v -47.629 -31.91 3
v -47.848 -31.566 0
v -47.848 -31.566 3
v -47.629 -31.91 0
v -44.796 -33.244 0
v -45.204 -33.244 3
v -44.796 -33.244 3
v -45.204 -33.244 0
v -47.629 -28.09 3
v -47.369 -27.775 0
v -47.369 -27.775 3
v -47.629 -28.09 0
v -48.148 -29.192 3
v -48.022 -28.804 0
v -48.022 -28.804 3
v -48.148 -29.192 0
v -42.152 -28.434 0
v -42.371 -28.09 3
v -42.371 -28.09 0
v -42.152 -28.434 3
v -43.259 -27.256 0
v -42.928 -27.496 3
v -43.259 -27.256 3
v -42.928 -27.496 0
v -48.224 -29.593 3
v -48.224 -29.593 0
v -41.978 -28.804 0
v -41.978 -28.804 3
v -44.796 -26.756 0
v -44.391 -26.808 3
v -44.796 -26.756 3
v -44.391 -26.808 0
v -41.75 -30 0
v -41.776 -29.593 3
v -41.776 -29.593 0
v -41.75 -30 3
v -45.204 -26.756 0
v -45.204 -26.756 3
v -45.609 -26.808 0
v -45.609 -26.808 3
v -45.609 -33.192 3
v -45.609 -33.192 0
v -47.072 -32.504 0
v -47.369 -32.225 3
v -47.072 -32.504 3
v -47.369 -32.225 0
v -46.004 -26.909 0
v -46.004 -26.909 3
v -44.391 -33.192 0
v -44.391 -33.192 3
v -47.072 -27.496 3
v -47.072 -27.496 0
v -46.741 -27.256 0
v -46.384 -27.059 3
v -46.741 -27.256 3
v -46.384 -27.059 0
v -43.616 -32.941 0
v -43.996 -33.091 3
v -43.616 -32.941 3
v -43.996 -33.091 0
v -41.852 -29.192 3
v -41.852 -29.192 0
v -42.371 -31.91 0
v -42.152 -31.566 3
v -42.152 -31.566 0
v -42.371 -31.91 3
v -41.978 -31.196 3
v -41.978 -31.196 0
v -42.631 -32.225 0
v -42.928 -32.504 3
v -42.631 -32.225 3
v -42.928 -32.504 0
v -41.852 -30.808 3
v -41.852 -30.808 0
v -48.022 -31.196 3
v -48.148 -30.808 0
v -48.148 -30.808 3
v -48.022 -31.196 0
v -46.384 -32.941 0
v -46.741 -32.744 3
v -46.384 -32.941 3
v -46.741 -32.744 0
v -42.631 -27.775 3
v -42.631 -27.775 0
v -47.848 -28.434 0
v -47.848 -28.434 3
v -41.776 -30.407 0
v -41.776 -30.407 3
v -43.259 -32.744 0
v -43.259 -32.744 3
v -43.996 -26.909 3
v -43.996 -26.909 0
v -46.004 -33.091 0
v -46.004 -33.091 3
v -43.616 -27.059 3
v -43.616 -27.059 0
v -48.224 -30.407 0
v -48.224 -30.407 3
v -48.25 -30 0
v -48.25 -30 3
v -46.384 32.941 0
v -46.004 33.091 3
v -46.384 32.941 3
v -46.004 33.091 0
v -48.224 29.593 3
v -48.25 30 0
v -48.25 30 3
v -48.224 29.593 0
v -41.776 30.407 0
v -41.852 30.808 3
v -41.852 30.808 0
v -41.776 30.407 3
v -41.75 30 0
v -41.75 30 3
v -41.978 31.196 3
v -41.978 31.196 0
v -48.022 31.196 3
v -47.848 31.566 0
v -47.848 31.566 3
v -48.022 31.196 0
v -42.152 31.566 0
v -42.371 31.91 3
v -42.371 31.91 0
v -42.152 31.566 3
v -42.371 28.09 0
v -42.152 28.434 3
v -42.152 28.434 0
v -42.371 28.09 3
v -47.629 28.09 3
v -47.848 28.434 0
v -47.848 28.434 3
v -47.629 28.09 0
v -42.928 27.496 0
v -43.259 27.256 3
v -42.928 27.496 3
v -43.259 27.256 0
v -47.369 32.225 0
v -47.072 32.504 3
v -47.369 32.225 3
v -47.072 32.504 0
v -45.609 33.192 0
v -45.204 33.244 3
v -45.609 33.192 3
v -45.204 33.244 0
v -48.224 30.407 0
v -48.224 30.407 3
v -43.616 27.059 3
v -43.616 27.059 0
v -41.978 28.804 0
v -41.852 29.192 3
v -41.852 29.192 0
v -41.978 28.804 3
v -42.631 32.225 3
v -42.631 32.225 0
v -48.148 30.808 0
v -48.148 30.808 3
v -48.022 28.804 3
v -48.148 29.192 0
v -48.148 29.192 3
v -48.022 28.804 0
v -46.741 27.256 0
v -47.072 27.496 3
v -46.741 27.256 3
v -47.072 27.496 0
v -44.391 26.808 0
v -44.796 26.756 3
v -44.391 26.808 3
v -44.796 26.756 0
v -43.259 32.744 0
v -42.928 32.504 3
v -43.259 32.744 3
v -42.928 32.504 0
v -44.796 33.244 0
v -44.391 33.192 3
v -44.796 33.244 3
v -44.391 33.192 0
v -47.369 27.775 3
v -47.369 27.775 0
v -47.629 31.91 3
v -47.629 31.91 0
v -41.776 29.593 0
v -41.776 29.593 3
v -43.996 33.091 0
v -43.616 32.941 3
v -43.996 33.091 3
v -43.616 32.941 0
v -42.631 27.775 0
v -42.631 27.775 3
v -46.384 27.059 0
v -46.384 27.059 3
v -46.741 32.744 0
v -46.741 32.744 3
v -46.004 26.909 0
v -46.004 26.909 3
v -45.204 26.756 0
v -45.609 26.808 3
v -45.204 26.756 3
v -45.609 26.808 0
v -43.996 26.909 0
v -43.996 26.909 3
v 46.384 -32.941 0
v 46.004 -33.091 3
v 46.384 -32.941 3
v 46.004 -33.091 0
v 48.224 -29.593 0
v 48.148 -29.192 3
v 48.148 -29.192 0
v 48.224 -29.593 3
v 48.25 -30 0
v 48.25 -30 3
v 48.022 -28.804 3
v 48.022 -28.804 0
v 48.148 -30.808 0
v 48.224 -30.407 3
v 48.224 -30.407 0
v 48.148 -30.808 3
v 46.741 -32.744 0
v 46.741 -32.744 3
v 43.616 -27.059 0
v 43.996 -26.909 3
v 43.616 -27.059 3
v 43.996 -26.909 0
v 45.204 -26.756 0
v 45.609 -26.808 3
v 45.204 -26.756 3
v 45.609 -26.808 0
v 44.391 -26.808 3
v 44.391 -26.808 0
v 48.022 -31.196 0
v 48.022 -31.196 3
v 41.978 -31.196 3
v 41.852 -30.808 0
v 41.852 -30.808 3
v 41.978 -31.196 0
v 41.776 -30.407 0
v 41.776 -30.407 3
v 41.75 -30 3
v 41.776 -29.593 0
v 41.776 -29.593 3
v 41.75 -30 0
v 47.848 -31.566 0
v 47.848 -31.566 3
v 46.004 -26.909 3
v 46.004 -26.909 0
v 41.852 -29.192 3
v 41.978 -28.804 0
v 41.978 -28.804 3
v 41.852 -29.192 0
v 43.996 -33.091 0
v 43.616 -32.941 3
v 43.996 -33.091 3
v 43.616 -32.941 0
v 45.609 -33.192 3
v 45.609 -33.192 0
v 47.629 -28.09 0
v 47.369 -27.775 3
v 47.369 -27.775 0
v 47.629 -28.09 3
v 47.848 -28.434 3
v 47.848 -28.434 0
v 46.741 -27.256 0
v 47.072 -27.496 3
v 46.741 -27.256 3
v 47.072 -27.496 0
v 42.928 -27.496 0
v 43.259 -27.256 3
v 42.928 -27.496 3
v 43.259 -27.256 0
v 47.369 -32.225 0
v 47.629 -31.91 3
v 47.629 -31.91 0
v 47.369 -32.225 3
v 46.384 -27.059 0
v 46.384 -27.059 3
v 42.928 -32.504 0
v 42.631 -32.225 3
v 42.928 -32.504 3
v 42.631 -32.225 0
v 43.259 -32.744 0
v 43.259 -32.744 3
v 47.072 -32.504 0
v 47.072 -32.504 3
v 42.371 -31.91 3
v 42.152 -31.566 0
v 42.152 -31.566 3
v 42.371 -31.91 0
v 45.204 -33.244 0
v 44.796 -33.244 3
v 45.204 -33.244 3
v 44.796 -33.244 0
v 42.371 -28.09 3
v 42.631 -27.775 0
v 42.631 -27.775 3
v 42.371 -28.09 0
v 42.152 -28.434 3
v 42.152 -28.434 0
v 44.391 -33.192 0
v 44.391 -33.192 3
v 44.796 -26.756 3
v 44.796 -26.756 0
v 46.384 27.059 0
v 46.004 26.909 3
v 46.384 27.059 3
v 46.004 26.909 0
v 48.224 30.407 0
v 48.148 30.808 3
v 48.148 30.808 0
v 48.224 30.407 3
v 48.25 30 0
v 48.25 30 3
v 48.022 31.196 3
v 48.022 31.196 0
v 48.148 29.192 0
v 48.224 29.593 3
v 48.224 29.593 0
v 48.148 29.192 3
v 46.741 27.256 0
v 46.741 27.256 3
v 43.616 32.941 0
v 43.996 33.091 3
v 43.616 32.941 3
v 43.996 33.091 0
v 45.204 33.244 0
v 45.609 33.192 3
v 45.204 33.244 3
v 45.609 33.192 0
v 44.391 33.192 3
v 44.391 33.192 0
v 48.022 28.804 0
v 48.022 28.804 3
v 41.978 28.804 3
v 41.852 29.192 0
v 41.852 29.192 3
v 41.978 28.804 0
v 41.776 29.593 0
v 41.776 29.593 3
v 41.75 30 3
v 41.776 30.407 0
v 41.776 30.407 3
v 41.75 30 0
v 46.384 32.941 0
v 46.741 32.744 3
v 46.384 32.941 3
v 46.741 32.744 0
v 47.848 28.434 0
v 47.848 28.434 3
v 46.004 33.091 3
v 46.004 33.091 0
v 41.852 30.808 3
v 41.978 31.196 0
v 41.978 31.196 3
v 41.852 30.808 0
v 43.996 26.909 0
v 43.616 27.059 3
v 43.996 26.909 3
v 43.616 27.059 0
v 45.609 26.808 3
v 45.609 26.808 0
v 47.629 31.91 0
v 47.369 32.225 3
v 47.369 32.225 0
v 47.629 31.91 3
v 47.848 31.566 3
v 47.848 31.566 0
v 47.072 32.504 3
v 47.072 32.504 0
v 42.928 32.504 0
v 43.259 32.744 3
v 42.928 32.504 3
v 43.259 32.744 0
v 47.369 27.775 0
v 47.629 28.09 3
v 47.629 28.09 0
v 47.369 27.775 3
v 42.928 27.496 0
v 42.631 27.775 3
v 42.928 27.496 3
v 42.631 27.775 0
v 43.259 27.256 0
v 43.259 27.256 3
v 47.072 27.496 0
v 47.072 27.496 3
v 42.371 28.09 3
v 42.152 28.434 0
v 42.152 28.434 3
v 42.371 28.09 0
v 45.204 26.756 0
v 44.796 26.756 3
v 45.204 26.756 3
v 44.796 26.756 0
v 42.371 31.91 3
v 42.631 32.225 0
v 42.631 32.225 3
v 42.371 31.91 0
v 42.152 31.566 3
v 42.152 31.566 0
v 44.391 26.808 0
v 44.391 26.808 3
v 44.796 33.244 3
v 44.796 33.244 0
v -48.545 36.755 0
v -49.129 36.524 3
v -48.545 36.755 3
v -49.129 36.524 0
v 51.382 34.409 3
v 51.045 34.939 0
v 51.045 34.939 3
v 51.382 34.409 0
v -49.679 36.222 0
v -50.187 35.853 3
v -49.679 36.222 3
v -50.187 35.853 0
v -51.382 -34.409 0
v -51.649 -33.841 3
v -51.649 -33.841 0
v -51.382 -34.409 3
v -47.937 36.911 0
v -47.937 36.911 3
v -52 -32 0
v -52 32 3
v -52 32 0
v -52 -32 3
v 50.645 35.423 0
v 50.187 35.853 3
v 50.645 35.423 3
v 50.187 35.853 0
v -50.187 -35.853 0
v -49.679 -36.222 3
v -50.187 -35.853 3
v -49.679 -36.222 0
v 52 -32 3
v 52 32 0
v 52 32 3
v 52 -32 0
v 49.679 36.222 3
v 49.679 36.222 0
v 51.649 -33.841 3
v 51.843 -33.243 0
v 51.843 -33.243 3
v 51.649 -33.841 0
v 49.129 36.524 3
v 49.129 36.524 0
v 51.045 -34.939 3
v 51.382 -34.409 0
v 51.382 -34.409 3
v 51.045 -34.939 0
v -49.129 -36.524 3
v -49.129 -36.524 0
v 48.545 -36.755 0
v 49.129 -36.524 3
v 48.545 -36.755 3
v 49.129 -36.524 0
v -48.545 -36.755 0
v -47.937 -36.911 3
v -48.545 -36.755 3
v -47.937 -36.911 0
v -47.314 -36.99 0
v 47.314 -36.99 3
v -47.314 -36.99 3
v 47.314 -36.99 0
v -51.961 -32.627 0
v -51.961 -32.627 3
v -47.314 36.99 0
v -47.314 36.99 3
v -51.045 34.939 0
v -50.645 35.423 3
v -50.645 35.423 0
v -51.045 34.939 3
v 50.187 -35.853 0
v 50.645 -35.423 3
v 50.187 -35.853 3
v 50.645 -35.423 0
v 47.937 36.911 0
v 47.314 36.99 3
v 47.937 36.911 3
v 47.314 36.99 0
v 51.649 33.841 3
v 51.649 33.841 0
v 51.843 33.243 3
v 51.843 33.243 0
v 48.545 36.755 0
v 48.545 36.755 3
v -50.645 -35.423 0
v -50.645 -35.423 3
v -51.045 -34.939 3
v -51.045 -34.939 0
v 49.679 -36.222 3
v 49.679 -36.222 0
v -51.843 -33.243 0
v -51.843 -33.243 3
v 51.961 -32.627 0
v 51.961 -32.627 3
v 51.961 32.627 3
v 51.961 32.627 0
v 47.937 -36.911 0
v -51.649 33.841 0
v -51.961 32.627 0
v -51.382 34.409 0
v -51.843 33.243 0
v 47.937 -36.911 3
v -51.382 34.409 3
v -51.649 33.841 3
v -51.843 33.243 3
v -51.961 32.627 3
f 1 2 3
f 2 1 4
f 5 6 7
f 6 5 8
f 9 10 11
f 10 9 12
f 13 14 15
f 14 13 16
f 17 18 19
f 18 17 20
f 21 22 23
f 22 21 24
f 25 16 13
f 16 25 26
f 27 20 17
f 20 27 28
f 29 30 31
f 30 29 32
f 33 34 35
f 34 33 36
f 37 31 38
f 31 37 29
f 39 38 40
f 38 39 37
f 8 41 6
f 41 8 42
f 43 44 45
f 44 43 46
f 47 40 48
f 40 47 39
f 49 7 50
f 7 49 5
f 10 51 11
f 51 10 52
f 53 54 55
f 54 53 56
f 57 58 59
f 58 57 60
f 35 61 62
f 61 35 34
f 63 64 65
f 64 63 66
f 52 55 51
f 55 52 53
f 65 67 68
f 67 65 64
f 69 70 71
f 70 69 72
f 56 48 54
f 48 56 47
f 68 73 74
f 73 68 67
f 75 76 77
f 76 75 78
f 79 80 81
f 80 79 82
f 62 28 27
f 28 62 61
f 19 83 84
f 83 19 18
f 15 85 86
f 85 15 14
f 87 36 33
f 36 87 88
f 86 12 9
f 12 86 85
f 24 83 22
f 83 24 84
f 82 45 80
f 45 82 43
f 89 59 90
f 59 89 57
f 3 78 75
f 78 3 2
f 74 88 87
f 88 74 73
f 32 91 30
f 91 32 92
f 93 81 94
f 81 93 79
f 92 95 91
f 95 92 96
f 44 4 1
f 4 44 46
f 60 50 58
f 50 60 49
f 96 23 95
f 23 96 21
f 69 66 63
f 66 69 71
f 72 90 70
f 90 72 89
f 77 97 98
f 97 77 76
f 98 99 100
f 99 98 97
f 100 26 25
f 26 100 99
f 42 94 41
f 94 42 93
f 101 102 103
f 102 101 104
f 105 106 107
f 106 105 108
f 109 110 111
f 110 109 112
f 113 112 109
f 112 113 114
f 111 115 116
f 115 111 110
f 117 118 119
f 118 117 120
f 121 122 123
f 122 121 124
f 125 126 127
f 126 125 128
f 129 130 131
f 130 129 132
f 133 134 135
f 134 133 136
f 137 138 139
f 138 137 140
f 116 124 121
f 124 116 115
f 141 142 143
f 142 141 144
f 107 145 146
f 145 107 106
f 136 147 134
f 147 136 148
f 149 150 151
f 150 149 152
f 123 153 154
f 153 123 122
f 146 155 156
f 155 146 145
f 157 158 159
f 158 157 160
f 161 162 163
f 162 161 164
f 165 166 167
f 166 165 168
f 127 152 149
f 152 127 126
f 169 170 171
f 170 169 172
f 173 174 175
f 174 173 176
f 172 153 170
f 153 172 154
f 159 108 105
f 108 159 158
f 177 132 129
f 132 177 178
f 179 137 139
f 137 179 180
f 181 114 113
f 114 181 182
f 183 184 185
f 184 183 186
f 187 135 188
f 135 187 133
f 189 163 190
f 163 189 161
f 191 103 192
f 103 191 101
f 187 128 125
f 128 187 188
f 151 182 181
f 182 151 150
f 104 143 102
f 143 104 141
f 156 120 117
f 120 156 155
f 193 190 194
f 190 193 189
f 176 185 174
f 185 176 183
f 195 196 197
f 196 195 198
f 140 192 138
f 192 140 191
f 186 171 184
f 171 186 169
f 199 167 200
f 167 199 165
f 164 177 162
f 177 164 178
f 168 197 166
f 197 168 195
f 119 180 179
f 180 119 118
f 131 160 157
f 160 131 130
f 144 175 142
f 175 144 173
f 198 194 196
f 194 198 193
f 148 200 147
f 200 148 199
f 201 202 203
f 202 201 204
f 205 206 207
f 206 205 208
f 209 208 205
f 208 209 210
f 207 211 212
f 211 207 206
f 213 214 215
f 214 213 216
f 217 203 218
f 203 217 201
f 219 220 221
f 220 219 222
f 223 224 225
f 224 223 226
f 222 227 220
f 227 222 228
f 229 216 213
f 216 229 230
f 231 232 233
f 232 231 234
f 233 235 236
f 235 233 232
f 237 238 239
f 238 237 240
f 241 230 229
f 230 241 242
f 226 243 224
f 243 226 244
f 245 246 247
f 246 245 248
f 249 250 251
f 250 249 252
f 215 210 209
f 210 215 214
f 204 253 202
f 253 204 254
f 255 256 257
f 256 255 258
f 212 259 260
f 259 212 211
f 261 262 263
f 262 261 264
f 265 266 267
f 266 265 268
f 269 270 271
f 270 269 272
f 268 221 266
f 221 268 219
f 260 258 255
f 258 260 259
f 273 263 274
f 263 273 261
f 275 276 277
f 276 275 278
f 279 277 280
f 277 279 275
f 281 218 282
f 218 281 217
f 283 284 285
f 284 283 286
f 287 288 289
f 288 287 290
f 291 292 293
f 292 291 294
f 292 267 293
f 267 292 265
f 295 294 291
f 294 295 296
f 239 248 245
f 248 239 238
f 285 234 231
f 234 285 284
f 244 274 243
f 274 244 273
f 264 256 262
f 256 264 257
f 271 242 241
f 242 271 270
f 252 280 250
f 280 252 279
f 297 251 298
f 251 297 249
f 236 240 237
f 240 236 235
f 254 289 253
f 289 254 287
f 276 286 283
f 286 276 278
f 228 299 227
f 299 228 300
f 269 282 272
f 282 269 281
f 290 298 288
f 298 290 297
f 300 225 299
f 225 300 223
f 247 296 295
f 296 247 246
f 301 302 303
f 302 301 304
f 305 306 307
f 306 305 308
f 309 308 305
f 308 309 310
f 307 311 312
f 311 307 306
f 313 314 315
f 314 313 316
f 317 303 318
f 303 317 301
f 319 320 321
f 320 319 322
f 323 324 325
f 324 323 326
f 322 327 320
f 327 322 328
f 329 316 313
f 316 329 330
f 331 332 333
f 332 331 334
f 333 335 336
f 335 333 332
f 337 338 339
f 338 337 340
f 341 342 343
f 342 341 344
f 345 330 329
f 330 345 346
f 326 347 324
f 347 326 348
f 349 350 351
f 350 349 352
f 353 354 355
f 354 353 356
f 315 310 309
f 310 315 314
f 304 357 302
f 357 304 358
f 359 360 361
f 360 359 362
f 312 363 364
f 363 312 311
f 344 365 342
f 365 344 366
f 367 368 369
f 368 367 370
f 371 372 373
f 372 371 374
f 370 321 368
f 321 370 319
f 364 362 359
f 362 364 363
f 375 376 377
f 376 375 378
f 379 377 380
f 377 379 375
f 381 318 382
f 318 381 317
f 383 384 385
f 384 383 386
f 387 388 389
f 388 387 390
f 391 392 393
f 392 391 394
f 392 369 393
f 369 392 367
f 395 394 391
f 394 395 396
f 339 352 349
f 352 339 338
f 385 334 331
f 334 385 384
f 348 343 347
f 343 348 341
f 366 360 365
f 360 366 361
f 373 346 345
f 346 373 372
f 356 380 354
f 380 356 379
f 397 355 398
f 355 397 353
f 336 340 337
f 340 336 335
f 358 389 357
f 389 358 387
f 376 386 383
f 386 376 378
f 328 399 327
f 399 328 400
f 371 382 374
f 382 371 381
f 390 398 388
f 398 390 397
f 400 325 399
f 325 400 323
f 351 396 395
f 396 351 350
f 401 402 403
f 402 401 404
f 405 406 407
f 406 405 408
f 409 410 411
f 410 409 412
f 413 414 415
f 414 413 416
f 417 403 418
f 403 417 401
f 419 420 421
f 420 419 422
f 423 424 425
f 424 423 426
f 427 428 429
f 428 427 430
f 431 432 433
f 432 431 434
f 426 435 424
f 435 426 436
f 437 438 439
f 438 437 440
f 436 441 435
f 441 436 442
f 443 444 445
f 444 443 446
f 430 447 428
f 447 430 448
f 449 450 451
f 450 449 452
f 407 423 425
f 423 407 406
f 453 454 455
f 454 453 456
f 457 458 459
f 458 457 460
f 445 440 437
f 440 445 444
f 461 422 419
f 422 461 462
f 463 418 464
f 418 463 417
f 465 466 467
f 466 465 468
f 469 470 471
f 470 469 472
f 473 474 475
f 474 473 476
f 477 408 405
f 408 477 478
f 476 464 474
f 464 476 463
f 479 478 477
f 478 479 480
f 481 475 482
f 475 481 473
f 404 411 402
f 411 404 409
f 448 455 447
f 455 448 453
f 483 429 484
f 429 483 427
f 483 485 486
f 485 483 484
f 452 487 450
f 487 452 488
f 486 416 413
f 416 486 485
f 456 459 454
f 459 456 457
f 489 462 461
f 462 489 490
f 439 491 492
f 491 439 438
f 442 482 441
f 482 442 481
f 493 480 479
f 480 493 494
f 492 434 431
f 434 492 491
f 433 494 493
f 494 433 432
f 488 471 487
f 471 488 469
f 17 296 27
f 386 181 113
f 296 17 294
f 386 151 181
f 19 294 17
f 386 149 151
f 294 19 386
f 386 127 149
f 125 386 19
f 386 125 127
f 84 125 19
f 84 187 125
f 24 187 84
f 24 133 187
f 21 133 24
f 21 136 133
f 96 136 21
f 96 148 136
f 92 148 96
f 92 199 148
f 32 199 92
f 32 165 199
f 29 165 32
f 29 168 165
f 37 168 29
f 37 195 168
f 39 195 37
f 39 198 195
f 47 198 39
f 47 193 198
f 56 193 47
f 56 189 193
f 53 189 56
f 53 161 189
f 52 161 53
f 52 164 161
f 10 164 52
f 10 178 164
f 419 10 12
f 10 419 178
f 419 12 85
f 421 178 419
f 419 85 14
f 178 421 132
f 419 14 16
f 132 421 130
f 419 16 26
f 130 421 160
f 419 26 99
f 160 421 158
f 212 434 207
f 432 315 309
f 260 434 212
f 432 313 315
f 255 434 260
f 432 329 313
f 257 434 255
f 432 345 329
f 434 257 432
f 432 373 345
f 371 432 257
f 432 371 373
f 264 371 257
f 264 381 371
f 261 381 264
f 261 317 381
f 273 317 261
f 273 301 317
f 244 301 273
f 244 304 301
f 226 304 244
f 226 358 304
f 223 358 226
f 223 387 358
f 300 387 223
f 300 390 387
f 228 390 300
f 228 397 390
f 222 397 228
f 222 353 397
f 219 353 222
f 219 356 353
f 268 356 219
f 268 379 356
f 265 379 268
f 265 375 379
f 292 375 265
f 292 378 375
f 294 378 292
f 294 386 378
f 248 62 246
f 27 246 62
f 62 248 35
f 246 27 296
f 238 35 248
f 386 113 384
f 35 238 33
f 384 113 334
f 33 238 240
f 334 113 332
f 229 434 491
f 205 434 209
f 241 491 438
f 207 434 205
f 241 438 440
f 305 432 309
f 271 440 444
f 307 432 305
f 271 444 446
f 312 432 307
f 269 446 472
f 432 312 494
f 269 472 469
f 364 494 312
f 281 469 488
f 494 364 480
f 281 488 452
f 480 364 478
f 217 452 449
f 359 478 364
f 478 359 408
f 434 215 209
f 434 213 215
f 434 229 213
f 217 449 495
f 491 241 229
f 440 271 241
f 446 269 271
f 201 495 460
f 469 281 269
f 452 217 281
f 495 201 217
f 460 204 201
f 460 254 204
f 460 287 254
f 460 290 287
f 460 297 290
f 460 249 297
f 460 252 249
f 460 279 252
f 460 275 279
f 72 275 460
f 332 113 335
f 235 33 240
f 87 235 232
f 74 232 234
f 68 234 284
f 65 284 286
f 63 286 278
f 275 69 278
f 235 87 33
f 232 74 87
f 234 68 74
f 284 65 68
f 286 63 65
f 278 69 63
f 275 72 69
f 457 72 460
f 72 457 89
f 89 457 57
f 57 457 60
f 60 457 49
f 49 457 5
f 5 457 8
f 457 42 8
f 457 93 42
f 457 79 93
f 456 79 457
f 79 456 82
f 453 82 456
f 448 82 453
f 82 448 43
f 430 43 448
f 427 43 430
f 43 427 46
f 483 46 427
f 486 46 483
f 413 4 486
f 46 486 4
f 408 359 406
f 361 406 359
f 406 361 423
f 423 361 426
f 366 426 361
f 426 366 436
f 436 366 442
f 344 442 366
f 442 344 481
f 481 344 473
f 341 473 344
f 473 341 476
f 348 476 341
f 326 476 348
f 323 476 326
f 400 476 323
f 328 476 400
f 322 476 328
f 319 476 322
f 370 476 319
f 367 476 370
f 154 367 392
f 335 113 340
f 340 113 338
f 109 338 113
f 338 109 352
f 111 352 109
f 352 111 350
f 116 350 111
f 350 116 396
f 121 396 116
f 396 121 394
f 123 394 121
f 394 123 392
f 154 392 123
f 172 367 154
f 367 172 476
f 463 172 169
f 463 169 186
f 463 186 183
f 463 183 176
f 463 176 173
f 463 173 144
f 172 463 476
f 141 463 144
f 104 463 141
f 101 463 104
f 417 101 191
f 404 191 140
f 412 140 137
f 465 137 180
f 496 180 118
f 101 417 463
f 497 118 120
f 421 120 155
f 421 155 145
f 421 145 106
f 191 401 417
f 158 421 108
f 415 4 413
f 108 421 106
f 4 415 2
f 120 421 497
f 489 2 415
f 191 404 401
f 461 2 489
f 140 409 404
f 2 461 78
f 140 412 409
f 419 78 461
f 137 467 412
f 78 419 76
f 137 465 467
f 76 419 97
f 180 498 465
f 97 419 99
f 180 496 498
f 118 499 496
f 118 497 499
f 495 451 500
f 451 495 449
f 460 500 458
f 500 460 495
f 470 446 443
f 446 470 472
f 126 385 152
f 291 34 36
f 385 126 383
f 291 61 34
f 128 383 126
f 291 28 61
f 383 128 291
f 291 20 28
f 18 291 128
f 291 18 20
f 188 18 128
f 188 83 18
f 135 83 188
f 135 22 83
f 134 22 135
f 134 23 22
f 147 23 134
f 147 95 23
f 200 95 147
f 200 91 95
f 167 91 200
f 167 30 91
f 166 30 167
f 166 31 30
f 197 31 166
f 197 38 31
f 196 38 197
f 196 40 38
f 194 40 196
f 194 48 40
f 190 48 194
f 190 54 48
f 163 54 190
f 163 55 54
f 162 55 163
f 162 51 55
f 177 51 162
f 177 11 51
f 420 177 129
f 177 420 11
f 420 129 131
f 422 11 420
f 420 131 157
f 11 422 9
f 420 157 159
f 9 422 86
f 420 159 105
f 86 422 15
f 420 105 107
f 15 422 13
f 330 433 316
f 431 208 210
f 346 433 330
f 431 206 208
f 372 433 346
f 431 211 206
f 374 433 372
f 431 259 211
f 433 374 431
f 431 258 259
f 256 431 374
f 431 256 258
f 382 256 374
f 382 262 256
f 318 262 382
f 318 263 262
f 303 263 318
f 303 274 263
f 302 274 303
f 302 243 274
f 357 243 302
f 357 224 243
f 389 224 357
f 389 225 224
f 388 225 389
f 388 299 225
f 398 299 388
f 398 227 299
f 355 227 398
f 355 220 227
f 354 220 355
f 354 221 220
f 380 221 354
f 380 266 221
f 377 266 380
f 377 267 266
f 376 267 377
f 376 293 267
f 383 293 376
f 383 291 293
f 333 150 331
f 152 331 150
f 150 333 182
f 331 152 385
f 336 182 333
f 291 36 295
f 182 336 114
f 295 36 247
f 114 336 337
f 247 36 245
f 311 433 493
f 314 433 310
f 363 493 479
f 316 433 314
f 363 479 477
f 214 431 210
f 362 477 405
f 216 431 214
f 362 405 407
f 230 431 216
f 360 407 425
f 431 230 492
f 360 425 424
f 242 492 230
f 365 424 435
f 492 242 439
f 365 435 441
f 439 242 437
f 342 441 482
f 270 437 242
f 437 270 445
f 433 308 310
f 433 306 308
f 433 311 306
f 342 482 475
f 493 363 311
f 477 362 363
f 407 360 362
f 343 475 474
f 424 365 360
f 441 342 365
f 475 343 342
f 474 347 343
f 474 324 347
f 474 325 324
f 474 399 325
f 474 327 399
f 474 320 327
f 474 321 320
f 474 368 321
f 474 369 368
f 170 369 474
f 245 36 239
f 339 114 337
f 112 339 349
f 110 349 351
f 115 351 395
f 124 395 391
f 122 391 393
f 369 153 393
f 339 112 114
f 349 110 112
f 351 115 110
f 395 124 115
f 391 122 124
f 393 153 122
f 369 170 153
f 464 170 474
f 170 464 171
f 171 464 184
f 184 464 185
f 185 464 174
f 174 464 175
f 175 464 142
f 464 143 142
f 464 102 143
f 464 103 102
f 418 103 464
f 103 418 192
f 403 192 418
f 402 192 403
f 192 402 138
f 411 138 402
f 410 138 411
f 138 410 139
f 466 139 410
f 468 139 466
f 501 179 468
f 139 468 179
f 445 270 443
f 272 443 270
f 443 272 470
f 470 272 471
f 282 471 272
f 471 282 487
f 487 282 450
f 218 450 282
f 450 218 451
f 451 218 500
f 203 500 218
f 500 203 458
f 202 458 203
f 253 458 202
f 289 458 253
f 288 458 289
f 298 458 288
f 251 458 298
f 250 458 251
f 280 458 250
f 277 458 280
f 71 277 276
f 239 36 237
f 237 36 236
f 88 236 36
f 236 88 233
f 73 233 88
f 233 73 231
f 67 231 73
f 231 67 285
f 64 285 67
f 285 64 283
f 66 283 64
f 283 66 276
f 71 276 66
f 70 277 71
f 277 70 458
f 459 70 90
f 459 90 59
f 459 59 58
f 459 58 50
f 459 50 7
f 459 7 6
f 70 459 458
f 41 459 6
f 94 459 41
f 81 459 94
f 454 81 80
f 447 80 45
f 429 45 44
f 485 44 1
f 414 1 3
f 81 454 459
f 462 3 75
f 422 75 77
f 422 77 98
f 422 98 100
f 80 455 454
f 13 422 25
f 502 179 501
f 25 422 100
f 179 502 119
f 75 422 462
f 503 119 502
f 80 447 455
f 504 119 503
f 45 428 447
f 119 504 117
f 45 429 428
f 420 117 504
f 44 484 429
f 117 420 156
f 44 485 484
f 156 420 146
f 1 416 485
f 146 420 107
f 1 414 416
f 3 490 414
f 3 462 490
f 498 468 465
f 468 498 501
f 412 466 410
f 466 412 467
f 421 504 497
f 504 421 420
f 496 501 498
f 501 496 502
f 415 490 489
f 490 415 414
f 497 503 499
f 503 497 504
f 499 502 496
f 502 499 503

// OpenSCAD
$fn = 50;


difference() {
	union() {
		hull() {
			translate(v = [-47.0000000000, 32.0000000000, 0]) {
				cylinder(h = 3, r = 5);
			}
			translate(v = [47.0000000000, 32.0000000000, 0]) {
				cylinder(h = 3, r = 5);
			}
			translate(v = [-47.0000000000, -32.0000000000, 0]) {
				cylinder(h = 3, r = 5);
			}
			translate(v = [47.0000000000, -32.0000000000, 0]) {
				cylinder(h = 3, r = 5);
			}
		}
	}
	union() {
		translate(v = [-45.0000000000, -30.0000000000, -100.0000000000]) {
			cylinder(h = 200, r = 3.2500000000);
		}
		translate(v = [-45.0000000000, 30.0000000000, -100.0000000000]) {
			cylinder(h = 200, r = 3.2500000000);
		}
		translate(v = [45.0000000000, -30.0000000000, -100.0000000000]) {
			cylinder(h = 200, r = 3.2500000000);
		}
		translate(v = [45.0000000000, 30.0000000000, -100.0000000000]) {
			cylinder(h = 200, r = 3.2500000000);
		}
	}
}
